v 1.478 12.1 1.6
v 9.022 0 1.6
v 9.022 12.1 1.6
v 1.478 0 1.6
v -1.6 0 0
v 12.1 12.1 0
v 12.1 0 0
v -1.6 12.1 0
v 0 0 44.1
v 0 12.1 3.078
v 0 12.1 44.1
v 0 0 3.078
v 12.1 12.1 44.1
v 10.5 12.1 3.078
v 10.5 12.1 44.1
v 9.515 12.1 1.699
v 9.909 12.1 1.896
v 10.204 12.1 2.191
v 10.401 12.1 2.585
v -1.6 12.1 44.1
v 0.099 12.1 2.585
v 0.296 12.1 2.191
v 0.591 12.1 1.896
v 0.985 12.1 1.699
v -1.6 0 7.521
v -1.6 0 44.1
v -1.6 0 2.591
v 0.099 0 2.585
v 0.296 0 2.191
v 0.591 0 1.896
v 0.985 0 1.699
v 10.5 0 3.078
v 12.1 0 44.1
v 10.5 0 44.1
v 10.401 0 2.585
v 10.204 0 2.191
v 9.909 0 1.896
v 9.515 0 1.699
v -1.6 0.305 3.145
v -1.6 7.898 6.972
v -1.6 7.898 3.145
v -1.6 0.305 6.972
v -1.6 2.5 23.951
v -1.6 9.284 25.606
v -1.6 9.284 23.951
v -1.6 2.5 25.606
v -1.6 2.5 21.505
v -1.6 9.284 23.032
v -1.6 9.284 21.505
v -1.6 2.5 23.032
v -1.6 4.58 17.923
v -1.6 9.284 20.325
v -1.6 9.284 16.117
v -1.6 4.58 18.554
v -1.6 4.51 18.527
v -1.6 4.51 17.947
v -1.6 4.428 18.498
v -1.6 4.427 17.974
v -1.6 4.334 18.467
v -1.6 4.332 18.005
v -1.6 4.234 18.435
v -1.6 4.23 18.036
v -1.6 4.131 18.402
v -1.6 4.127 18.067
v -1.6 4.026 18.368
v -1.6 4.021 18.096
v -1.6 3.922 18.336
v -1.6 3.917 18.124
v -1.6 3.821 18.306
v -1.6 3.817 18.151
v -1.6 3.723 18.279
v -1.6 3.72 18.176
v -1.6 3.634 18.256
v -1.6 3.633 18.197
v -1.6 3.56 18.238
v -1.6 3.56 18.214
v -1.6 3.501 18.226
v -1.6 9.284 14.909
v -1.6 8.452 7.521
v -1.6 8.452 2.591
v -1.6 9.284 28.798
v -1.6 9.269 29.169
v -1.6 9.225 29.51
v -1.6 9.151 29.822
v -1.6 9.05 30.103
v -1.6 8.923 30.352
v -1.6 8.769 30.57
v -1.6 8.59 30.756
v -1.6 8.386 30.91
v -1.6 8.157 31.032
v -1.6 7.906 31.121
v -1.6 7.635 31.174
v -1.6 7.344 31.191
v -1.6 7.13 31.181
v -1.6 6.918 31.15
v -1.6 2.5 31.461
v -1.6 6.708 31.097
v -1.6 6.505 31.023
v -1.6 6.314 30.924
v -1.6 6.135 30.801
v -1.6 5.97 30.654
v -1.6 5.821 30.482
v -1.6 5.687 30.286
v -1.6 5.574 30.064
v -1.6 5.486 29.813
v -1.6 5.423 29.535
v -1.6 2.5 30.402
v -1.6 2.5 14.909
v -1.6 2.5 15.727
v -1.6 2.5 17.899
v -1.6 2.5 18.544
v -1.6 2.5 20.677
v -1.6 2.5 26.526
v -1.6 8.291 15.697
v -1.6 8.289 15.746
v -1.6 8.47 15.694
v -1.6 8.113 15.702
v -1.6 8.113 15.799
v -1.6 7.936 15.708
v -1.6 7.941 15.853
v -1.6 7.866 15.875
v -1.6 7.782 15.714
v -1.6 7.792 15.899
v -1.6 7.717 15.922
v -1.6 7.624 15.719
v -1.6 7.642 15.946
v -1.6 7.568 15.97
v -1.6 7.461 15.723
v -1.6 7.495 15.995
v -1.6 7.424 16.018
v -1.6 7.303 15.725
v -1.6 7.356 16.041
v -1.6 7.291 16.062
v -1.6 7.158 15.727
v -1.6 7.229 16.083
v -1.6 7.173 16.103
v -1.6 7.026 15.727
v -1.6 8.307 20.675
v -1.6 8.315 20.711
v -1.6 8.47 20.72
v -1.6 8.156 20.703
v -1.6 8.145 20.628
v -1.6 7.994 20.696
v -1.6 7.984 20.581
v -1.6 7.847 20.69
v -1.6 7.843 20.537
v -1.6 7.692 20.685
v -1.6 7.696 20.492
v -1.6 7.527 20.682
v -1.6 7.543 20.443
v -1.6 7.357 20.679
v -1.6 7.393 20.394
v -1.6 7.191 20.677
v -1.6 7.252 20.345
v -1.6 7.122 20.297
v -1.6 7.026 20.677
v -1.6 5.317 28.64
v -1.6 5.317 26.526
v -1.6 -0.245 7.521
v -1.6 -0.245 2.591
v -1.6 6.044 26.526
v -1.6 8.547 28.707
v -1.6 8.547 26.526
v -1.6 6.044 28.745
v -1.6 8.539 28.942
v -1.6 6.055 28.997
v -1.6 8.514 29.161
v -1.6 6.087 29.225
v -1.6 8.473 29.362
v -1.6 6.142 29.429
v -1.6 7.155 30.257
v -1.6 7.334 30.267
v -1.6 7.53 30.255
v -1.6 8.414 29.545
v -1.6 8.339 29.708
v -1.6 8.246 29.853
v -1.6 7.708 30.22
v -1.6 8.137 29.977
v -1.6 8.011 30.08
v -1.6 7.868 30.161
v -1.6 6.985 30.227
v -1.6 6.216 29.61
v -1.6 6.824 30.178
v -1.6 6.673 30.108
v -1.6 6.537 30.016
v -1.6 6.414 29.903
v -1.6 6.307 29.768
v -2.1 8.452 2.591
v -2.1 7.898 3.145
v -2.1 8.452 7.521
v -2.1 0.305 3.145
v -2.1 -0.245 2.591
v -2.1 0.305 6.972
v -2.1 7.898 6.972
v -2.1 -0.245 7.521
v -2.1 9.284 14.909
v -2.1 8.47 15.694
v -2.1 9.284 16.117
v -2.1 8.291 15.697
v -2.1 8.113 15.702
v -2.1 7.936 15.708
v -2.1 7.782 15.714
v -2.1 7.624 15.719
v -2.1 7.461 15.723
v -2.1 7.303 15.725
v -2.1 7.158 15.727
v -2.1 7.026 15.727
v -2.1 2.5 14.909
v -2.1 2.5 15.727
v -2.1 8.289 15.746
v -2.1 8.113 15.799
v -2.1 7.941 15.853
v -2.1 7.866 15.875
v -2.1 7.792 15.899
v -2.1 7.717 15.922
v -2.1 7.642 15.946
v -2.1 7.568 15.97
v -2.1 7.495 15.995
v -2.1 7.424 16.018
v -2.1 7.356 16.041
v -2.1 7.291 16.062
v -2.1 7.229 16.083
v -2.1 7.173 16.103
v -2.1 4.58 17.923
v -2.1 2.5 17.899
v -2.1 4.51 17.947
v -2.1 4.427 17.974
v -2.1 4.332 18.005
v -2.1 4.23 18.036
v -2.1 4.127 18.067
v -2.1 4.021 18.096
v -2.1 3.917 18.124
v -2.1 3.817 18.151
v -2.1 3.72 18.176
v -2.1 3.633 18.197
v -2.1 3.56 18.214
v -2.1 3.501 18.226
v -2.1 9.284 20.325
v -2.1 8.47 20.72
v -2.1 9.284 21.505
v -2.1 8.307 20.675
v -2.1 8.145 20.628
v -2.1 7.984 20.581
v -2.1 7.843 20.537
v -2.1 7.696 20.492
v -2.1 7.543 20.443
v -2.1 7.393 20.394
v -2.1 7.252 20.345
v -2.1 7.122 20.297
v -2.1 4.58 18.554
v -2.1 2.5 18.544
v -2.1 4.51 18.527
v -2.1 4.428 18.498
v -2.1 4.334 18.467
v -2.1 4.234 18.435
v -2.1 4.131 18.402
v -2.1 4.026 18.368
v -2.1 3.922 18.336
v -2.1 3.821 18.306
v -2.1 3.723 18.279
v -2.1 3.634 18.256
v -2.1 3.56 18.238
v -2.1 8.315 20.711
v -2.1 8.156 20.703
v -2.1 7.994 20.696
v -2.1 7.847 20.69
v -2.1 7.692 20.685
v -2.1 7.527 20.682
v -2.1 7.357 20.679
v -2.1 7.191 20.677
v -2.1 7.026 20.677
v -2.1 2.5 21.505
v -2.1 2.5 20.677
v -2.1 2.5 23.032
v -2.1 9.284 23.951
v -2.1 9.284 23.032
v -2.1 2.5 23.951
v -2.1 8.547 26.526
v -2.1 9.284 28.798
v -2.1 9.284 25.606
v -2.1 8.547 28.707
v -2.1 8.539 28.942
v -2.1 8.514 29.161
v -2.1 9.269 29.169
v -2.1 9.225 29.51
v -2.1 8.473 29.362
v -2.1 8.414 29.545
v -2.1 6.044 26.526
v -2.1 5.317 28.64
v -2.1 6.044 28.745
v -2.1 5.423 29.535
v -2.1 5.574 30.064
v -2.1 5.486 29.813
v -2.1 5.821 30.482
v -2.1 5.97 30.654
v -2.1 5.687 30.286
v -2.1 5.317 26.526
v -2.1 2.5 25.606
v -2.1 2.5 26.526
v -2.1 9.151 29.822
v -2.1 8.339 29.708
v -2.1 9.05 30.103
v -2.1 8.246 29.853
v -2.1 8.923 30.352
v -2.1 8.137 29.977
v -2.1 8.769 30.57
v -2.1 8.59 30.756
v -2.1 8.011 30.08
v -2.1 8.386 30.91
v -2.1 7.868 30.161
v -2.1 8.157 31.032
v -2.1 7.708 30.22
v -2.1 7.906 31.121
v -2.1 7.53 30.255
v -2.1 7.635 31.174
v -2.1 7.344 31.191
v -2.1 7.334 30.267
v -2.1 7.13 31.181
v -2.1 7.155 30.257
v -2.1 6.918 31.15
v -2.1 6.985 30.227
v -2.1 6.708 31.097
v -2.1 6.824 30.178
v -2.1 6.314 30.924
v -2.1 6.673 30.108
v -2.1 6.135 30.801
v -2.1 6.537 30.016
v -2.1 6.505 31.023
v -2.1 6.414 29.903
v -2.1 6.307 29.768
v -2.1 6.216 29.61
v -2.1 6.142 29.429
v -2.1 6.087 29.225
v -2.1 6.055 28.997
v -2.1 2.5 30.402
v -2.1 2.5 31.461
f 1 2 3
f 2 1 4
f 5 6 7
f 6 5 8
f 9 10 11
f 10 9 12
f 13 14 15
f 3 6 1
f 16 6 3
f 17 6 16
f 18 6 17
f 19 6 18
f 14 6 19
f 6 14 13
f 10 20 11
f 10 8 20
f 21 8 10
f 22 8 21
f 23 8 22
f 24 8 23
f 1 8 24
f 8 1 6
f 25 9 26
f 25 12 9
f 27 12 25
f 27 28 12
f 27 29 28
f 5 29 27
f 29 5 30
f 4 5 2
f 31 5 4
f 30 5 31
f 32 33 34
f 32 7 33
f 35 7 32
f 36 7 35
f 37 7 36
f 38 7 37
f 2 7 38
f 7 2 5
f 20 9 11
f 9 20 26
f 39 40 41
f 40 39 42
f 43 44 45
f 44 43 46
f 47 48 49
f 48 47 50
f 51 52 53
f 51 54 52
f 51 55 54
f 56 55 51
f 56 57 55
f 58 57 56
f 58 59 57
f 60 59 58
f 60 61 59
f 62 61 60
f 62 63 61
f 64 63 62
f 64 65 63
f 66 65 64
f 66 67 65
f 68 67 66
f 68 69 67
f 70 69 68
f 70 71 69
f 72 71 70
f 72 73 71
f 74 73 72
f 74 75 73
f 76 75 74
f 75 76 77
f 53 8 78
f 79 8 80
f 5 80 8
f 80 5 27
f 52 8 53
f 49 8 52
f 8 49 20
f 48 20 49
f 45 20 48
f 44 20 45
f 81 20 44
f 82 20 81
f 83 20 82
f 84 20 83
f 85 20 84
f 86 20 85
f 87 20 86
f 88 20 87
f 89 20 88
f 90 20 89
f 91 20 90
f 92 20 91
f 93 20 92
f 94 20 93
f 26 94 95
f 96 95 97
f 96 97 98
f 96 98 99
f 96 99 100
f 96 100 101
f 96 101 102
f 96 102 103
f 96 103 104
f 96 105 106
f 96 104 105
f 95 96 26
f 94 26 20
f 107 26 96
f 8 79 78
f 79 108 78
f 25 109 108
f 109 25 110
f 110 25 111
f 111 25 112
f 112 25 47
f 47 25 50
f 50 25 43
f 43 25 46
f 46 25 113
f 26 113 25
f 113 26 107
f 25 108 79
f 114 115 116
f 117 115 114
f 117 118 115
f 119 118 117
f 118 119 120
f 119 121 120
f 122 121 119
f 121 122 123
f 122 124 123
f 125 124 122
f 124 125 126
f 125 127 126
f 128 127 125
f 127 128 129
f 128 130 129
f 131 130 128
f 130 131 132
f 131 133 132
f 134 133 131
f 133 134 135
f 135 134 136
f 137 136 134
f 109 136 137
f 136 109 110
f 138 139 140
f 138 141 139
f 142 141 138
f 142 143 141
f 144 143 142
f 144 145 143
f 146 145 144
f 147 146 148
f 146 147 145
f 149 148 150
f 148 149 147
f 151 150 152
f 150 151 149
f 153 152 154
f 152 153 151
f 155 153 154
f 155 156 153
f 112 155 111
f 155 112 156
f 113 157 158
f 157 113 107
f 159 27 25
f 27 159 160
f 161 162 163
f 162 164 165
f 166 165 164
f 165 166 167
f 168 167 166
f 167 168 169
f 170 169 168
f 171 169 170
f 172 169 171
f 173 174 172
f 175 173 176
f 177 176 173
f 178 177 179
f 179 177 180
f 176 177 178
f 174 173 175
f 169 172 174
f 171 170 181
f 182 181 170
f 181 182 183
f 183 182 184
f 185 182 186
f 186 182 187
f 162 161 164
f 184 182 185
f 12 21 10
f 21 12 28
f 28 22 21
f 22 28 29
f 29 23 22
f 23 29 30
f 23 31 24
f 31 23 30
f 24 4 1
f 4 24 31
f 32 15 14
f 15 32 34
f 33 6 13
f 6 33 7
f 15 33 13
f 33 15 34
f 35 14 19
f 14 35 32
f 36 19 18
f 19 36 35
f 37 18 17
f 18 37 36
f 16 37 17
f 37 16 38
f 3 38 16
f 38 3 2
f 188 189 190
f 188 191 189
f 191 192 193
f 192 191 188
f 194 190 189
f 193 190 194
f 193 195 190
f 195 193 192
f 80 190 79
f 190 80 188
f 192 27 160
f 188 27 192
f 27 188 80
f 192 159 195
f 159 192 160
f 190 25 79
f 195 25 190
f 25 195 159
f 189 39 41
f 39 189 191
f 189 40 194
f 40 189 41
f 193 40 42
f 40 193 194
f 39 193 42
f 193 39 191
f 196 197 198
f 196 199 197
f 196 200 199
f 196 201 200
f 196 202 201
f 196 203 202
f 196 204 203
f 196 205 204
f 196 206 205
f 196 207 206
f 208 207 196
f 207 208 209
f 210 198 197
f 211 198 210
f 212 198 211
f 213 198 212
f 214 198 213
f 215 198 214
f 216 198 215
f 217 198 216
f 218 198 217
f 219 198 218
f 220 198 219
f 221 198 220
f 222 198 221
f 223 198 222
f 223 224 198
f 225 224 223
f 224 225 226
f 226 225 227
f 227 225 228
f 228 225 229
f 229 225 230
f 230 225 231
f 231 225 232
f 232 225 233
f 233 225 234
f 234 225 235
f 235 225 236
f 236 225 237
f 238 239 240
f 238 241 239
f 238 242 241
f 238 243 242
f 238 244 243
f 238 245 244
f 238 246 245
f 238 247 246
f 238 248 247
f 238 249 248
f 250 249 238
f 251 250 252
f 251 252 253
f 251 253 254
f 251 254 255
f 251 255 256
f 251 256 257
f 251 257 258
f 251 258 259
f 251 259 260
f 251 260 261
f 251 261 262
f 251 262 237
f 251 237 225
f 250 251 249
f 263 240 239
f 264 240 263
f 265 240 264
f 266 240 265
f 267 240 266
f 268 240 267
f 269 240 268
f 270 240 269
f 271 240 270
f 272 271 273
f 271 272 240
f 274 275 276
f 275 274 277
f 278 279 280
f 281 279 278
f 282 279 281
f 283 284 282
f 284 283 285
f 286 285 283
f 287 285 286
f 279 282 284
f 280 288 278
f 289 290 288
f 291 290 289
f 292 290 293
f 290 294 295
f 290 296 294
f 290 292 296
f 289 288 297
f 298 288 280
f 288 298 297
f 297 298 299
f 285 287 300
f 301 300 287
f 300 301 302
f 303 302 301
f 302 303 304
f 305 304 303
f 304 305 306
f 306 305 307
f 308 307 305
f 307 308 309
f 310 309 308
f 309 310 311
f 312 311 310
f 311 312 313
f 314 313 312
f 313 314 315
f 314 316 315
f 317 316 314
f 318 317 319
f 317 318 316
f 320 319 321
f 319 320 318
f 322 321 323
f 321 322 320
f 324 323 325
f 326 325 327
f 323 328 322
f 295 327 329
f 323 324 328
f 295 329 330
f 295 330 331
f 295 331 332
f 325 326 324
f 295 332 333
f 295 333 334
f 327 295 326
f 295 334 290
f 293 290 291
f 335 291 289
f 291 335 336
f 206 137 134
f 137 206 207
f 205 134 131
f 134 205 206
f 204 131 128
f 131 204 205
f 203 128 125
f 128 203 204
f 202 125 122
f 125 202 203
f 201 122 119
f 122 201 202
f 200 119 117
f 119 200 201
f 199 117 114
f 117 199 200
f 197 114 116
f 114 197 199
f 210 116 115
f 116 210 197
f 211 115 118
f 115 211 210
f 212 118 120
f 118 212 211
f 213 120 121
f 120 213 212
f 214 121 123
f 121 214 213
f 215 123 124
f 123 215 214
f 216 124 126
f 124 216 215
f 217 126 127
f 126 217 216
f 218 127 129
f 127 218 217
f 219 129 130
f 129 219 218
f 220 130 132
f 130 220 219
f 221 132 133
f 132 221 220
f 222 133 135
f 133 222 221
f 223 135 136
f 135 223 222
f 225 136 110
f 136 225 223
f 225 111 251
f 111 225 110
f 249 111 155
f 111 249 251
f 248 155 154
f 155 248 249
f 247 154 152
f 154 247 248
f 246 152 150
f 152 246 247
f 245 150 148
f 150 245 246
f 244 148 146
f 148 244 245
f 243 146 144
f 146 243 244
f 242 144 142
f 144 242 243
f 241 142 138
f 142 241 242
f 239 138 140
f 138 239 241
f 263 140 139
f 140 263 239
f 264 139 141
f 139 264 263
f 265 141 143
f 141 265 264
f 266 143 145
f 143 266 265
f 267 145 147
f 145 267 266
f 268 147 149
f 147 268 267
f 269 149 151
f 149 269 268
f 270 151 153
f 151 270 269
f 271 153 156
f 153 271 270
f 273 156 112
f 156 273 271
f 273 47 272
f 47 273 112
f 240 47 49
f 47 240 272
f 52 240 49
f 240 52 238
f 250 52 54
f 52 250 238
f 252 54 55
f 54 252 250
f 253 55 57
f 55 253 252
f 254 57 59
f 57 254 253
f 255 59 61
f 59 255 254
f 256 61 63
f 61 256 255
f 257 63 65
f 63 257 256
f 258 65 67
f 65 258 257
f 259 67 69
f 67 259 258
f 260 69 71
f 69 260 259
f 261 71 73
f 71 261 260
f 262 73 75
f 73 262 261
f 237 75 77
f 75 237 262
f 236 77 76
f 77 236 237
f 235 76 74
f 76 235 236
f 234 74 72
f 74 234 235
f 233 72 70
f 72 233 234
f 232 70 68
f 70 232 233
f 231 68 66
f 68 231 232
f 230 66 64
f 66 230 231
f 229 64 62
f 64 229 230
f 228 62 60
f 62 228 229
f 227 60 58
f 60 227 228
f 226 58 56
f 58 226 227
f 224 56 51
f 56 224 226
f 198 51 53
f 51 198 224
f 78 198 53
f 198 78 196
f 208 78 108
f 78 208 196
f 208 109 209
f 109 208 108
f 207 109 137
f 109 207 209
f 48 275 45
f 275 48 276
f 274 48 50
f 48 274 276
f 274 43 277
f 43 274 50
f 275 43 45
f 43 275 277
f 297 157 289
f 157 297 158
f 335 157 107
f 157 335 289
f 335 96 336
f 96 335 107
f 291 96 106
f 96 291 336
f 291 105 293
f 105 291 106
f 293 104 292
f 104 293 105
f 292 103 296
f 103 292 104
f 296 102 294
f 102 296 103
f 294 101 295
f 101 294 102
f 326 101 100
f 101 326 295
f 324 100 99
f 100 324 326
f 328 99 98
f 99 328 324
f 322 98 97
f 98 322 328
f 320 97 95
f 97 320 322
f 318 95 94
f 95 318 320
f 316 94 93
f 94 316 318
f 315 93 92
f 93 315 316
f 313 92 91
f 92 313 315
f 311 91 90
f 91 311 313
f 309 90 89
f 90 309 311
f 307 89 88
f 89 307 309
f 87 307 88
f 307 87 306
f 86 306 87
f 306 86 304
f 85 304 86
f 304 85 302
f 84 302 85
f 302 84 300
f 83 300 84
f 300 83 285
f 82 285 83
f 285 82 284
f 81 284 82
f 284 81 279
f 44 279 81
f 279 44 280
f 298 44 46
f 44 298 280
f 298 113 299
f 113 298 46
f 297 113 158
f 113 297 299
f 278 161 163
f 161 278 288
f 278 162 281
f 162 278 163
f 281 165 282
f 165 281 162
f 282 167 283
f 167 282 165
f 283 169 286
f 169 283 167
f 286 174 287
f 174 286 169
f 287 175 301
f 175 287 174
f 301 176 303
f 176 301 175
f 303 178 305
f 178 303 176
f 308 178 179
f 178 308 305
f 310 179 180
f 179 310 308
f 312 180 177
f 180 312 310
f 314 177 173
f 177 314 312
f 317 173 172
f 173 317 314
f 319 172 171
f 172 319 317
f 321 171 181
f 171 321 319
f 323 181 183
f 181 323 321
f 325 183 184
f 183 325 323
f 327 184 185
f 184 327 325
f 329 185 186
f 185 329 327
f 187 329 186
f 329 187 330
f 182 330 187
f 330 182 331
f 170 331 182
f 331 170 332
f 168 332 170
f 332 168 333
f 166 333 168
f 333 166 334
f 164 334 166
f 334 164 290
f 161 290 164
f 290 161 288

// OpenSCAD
/* 

Customizable labels for card collections. These are meant to be attached to the sides of boxes to easily view what cards/sets are inside of the box.

Made by fellowapeman

https://www.printables.com/social/221869-fellowapeman/about


If you want to use MTG Set or Mana/Card Symbols:
    
    - Install MTG Set/Keyrune Fonts: https://keyrune.andrewgioia.com/
    - Install MTG Mana Symbol Fonts: https://mana.andrewgioia.com/
    
    ***IMPORTANT*** In Windows, OpenSCAD requires you to install fonts for ALL USERS in order to use them. Ensure you do this! Search google if you need help!

    After the font packs are installed for all users, input either "mana" or "keyrune" into the fontL or fontR parameters depending on which font you'd like to use. Then use andrewgioia's cheat sheets (see links below) to copy/paste the desired symbol into the textL or textR parameters.
    If everything was installed and configured properly, you should see the set symbols rendered in OpenSCAD!
    
    Cheat sheets can be found here:
    https://keyrune.andrewgioia.com/cheatsheet.html
    https://mana.andrewgioia.com/cheatsheet.html

*/

/* [Label Properties] */

// Width of cardboard box's sidewall. BCW boxes are ~10.5
width = 10.5;
// Width of faces
faceWidth = 12.1;
// Height of faces
faceHeight = 44.1;
// Thickness of label
thickness = 1.6;
// Text emboss thickness
textEmboss = 0.5;

/* [Text 1 Config] */
// Text1 field. If using "mana" or "keyrune" fonts, copy/paste the icon from the appropriate andrewgioia cheatsheet
text1 = "";
// Text1 font
font1 = "keyrune";
// Text1 font size
fontSize1 = 7.1;
// Text1 padding-left
paddingLeft1 = 2.1;
// Text1 padding-bottom
paddingBottom1 = 1.5;

/* [Text 2 Config] */
// Text2 field. If using "mana" or "keyrune" fonts, copy/paste the icon from the appropriate andrewgioia cheatsheet
text2 = "MIR";
// Text2 font
font2 = "Liberation Sans";
// Text2 font size
fontSize2 = 7.1;
// Text2 padding-left
paddingLeft2 = 14.1;
// Text2 padding-bottom
paddingBottom2 = 2.5;

// Fillet function
module fillet(r=1.0,steps=3,include=true) {
  if(include) for (k=[0:$children-1]) {
	children(k);
  }
  for (i=[0:$children-2] ) {
    for(j=[i+1:$children-1] ) {
	fillet_two(r=r,steps=steps) {
	  children(i);
	  children(j);
	  intersection() {
		children(i);
		children(j);
	  }
	}
    }
  }
}

module fillet_two(r=1.0,steps=3) {
  for(step=[1:steps]) {
	hull() {
	  render() intersection() {
		children(0);
		offset_3d(r=r*step/steps) children(2);
	  }
	  render() intersection() {
		children(1);
		offset_3d(r=r*(steps-step+1)/steps) children(2);
	  }
	}
  }
}

module offset_3d(r=1.0) {
  for(k=[0:$children-1]) minkowski() {
	children(k);
	sphere(r=r,$fn=8);
  }
}

module tabWidth() {
    cube([width,faceWidth,thickness]);
}

module tabBack() {
    translate([width,0,0]){
        cube([thickness,faceWidth,faceHeight]);
    }
}

module tabFront() {
    translate([-thickness,0,0]){                
        cube([thickness,faceWidth,faceHeight]);   
    }
}

module text1() {
    rotate([0,270,0]) {
        translate([paddingLeft1,paddingBottom1,thickness]){    
            linear_extrude(textEmboss) {
                text(text = str(text1), font = font1, size = fontSize1);
            }
        }
    }
}

module text2 () {
    rotate([0,270,0]) {
        translate([paddingLeft2,paddingBottom2,thickness]){
            linear_extrude(textEmboss) {
                text(text = str(text2), font = font2, size = fontSize2);
            }
        }
    }
}

fillet(r=thickness,steps=5) {
	tabWidth();
    tabFront();
}

fillet(r=thickness,steps=5) {
	tabWidth();
    tabBack();
}

text1();
text2();
